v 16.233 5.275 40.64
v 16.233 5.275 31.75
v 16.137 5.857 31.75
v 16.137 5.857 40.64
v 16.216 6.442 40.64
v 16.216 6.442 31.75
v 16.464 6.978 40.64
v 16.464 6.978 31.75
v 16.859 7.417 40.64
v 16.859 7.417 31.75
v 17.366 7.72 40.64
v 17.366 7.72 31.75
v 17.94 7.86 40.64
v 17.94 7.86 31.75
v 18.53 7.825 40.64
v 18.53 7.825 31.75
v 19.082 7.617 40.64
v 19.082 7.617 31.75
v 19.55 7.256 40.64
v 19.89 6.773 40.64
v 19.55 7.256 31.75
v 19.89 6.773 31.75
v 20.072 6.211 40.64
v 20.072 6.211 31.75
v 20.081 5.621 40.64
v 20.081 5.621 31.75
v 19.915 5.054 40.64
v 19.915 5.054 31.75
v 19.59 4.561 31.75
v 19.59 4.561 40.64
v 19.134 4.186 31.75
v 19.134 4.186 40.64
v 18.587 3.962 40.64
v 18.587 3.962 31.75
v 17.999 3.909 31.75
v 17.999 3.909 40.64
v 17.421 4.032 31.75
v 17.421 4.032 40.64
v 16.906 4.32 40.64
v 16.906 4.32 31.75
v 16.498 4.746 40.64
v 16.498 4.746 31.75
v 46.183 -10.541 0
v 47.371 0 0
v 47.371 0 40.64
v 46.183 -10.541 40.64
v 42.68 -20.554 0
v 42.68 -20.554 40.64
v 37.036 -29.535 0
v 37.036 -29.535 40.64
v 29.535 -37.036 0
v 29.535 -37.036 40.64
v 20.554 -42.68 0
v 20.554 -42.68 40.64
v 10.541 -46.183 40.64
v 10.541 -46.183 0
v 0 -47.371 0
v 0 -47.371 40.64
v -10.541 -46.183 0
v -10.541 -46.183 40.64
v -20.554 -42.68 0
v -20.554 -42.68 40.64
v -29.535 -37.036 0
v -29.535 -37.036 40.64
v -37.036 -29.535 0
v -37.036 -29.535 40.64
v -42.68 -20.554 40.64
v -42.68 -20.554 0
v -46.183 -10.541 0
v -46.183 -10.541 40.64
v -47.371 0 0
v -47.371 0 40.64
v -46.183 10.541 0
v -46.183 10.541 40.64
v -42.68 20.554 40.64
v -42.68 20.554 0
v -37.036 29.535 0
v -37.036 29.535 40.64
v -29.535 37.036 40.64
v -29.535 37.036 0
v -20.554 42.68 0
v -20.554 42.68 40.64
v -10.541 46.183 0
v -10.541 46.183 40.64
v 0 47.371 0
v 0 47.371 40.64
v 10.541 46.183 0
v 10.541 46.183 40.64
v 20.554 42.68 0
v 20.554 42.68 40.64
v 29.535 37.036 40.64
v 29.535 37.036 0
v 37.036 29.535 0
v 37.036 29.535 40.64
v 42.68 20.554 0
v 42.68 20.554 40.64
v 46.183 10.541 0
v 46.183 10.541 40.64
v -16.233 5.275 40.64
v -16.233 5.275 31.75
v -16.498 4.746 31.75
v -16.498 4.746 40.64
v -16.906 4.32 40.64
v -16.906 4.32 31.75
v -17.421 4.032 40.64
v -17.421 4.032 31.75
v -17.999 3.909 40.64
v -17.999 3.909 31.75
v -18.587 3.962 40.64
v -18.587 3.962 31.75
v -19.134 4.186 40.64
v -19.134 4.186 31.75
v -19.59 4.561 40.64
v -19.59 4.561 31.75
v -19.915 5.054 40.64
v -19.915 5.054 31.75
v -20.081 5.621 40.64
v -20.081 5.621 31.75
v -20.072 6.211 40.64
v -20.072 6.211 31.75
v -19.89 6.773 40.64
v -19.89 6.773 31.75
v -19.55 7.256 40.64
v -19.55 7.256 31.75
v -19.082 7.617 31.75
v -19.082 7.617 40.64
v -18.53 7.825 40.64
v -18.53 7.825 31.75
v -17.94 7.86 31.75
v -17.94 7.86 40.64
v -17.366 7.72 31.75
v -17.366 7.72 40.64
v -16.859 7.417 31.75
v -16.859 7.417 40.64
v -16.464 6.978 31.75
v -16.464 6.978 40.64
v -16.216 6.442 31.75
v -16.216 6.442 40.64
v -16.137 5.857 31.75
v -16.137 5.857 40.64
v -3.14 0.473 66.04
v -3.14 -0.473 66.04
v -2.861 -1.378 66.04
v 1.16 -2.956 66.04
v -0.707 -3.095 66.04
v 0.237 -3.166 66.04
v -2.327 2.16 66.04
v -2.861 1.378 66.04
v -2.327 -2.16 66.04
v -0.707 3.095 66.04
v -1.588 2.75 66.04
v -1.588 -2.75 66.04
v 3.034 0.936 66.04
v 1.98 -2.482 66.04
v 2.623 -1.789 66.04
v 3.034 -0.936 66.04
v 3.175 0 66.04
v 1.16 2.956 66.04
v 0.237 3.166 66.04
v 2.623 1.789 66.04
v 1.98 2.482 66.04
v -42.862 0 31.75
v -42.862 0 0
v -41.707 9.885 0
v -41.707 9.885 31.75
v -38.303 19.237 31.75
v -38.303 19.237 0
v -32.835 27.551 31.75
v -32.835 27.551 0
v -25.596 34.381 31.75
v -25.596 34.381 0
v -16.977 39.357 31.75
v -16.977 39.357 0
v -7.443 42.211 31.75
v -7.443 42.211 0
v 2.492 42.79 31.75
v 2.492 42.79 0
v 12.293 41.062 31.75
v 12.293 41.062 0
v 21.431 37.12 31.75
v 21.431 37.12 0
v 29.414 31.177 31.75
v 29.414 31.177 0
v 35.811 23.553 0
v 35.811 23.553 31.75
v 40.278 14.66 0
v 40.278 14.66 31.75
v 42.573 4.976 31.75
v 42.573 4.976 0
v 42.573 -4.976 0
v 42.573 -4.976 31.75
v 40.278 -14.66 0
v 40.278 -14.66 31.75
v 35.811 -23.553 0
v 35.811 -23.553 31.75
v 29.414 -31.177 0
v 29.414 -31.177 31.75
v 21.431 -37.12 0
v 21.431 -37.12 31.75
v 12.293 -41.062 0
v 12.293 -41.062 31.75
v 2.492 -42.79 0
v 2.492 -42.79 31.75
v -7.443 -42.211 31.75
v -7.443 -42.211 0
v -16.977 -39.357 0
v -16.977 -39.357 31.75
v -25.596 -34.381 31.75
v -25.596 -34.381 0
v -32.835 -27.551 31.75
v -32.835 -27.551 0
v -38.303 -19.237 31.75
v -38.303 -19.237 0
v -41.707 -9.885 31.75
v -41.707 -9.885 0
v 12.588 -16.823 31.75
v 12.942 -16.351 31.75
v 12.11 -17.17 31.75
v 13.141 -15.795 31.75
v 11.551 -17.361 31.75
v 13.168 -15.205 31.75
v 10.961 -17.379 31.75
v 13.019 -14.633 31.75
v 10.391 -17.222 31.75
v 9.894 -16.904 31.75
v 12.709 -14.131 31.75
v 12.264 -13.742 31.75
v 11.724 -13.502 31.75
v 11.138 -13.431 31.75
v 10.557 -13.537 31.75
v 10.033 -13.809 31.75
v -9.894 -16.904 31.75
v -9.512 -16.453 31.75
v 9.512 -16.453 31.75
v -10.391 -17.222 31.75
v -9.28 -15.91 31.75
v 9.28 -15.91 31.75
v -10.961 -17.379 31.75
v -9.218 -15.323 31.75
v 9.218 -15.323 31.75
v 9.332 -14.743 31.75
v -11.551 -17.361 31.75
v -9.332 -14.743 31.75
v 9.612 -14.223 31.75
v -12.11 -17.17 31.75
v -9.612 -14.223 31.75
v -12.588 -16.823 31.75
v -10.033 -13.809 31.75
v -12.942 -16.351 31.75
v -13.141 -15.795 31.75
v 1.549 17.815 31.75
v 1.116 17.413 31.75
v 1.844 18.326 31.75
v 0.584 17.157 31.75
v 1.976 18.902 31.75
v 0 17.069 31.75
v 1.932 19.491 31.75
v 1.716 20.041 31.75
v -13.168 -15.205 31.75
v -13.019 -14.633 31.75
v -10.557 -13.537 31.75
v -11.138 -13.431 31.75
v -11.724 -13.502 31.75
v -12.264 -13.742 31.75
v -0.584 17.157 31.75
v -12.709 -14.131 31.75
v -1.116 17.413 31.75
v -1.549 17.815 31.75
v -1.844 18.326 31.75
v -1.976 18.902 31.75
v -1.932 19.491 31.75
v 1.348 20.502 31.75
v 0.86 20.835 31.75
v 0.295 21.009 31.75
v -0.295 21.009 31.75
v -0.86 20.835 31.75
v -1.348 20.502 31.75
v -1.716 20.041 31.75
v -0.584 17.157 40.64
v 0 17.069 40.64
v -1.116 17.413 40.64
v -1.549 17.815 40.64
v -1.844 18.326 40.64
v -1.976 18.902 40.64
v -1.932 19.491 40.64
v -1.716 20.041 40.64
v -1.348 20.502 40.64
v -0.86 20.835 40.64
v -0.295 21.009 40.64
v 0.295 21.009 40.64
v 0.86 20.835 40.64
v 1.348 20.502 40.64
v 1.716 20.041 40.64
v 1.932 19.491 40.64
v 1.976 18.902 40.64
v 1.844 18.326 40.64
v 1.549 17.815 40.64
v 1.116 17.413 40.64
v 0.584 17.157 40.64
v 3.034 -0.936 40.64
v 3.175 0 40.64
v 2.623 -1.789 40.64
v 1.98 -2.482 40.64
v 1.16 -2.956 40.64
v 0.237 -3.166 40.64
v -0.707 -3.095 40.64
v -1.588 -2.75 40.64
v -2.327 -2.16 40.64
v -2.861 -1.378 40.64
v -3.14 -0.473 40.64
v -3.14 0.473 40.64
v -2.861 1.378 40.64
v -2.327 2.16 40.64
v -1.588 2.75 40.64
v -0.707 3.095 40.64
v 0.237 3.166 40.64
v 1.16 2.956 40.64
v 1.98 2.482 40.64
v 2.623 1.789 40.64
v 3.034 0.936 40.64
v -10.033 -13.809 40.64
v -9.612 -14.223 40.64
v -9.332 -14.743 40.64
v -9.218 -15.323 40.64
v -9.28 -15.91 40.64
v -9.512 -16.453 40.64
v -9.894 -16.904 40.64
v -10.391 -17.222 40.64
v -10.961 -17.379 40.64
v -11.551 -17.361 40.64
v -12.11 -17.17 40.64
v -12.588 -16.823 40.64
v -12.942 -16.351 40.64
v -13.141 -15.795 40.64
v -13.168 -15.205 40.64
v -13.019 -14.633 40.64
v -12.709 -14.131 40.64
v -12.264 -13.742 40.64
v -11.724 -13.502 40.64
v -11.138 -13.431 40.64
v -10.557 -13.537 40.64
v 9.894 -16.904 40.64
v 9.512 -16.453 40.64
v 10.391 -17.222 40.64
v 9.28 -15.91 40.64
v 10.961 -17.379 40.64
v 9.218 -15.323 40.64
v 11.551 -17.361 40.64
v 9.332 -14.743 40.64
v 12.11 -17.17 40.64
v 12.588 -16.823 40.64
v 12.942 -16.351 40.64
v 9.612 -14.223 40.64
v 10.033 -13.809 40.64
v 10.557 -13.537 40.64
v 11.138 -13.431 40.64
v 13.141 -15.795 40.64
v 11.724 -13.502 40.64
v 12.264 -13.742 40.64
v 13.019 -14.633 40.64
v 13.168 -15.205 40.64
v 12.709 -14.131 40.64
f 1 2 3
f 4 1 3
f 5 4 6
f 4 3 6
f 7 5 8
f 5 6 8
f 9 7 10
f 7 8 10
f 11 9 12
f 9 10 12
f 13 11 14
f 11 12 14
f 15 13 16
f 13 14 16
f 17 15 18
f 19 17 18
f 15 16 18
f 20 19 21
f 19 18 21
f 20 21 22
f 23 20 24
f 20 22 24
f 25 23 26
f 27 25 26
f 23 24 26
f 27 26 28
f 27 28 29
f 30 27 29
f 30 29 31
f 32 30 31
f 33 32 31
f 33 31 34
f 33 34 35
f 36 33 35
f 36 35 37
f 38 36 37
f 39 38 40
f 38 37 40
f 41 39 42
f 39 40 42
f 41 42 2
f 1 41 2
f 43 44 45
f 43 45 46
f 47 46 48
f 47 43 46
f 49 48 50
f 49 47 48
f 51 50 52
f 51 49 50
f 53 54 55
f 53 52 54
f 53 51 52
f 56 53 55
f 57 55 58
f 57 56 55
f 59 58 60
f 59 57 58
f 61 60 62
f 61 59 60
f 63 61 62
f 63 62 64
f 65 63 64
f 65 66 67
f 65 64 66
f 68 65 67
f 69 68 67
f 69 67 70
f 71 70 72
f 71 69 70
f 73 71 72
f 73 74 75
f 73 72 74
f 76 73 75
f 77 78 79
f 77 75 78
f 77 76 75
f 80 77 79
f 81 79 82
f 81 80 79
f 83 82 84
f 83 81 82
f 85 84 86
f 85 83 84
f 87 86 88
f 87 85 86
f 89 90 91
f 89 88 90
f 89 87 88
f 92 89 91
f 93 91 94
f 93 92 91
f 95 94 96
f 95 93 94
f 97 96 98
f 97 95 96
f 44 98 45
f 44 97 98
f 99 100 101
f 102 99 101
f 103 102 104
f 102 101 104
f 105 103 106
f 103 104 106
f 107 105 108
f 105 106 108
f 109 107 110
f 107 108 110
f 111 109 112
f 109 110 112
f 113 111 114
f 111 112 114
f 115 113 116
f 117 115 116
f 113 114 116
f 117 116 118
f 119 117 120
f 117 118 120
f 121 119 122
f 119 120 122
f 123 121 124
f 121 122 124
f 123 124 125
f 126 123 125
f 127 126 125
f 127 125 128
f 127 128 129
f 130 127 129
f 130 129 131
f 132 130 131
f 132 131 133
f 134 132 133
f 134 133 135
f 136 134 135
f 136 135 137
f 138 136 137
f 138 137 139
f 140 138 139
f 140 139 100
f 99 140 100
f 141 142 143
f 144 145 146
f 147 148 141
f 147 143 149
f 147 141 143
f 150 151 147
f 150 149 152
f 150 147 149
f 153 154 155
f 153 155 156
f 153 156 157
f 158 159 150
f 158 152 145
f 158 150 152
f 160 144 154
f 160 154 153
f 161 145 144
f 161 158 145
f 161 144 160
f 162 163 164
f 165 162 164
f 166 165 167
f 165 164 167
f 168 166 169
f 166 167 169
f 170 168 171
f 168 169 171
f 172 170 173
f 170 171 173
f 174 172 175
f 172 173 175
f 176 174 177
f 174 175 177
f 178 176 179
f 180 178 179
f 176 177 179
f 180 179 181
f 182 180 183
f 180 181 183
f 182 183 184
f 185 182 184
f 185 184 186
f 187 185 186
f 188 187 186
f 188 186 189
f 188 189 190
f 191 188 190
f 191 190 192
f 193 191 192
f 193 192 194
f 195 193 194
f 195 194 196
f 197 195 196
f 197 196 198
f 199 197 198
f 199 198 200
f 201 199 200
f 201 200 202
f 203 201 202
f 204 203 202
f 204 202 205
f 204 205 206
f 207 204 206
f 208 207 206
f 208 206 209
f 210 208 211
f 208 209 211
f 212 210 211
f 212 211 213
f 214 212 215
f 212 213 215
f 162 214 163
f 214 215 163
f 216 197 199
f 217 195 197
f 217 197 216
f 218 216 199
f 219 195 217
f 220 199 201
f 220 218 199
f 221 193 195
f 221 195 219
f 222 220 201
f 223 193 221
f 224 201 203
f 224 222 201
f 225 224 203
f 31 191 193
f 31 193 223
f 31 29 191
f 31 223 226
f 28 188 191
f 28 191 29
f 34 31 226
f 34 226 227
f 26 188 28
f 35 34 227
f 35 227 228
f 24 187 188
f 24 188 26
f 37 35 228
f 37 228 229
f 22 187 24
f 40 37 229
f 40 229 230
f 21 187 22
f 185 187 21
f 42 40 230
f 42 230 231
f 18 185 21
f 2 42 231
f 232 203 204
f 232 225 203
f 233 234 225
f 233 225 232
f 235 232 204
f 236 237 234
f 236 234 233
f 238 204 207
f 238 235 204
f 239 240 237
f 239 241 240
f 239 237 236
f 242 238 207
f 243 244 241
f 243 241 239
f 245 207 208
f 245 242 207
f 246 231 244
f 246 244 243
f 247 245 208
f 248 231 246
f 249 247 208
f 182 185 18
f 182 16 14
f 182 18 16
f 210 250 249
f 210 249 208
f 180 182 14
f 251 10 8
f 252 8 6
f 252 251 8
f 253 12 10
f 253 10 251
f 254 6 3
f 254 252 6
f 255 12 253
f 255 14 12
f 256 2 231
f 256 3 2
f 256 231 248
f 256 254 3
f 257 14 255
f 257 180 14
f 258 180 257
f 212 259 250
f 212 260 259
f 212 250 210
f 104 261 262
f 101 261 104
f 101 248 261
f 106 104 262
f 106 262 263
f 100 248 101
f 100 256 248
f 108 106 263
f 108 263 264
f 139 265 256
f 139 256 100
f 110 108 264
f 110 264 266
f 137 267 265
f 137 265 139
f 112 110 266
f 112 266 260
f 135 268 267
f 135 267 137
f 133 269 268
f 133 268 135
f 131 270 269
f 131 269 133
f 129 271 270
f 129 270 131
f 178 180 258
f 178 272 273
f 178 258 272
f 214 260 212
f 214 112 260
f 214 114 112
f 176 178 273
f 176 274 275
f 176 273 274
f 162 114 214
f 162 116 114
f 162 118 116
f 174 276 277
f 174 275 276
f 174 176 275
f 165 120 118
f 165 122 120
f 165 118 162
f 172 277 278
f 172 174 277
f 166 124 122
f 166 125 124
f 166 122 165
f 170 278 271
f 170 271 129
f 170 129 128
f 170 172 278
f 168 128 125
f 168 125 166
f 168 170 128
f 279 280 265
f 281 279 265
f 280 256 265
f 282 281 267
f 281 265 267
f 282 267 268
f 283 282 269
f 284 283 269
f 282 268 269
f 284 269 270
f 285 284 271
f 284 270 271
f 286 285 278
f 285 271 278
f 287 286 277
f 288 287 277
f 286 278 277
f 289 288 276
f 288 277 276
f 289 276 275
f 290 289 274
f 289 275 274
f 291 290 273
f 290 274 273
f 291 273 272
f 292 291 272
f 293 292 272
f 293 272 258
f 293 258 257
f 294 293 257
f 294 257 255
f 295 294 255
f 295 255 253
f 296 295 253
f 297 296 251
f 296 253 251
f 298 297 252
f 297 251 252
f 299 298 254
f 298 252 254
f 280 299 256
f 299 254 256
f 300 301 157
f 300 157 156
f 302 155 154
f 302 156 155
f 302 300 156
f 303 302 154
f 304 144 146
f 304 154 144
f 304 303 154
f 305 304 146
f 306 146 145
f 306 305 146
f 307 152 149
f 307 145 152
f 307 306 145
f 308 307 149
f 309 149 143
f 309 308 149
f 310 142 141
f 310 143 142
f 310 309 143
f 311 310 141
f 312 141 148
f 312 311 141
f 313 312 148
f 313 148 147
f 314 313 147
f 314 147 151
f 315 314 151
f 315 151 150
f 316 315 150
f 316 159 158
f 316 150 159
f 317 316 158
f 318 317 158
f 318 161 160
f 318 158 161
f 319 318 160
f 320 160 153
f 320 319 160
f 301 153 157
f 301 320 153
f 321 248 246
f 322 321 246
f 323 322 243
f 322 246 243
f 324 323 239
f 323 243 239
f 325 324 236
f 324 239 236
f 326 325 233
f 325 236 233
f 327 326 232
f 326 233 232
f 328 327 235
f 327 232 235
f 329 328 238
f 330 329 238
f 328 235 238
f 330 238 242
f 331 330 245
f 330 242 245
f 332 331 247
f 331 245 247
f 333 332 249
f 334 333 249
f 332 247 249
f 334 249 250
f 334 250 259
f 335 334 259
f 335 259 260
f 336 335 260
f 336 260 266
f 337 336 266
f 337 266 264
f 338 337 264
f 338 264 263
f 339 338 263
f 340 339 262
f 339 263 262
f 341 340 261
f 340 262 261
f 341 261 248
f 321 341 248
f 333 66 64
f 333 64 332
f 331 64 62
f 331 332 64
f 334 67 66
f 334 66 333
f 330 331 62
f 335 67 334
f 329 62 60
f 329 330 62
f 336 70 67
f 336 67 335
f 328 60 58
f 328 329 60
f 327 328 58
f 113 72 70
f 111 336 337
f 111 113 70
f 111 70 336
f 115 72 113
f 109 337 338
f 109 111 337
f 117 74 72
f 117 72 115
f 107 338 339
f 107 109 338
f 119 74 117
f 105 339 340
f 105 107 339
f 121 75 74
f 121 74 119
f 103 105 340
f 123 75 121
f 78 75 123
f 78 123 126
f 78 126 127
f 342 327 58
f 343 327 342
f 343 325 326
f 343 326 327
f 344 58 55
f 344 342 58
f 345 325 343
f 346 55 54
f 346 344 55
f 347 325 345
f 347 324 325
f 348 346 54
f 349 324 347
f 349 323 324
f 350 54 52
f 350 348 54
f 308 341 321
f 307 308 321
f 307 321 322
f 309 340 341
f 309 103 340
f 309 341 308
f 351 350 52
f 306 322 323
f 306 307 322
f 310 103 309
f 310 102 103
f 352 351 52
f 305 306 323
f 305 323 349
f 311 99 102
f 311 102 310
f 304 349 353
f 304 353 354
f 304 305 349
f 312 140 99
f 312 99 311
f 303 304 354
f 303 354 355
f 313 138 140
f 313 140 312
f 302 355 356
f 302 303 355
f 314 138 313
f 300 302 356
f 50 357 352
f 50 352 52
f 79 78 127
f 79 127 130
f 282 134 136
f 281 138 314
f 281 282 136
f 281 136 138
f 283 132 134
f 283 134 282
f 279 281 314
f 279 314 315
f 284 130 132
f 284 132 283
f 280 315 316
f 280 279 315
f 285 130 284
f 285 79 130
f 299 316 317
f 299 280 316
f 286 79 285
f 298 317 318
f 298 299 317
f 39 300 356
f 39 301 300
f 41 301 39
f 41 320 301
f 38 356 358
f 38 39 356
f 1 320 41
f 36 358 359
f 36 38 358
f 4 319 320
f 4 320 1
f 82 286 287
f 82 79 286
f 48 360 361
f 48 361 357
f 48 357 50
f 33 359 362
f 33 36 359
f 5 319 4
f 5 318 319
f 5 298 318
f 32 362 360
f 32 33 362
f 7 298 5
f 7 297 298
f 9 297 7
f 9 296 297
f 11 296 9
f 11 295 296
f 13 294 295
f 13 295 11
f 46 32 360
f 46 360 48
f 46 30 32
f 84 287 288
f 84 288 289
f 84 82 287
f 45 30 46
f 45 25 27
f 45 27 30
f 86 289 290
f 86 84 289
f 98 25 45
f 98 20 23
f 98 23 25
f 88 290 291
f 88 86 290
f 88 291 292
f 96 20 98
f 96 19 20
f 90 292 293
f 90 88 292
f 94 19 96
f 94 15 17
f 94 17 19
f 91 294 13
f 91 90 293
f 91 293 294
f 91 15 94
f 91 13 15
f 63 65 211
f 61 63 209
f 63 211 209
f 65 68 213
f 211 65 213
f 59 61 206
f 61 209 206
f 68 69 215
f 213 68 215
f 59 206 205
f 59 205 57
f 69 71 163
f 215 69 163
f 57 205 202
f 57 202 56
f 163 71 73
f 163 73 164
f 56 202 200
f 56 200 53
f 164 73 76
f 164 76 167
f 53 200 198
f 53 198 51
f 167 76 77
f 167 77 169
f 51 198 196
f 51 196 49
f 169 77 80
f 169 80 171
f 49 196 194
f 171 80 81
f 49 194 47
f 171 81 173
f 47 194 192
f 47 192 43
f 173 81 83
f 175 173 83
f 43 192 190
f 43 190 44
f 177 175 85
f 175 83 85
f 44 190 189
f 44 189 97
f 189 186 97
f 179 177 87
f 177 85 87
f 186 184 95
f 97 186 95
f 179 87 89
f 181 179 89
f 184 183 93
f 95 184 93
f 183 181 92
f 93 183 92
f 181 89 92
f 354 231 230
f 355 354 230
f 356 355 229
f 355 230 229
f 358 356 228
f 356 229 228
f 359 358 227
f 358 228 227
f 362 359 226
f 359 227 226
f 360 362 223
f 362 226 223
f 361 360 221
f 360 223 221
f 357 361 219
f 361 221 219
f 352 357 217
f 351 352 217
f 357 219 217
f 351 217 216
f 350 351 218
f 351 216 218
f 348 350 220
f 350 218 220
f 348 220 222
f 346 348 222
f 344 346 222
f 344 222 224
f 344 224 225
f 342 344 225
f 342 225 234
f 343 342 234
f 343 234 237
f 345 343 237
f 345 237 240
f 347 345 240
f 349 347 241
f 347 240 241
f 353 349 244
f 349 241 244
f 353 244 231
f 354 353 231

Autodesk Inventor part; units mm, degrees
ref_plane "YZ Plane" through (0, 0, 0) normal (1, 0, 0) x (0, 1, 0)
ref_plane "XZ Plane" through (0, 0, 0) normal (0, 1, 0) x (-1, 0, 0)
ref_plane "XY Plane" through (0, 0, 0) normal (0, 0, 1) x (1, 0, 0)
sketch "Sketch1" plane through (0, 0, 0) normal (0, 0, 1) x (1, 0, 0)
  circle A0 centre (0, 0) radius 47.371
  dimension "d0" = 94.742
extrude "Extrusion1" add sketch "Sketch1" along normal blind 40.64
sketch "Sketch2" plane through (0, 0, 0) normal (0, 0, -1) x (-1, 0, 0)
  circle A0 centre (0, 0) radius 42.8625
  dimension "d4" = 85.725
extrude "Extrusion2" cut sketch "Sketch2" against normal blind 31.75
sketch "Sketch6" plane through (0, 0, 40.64) normal (0, 0, 1) x (1, 0, 0)
  circle A0 centre (0, 0) radius 47.371 projected
  circle A1 centre (0, 0) radius 19.05
  line L0 (0, 19.05) -> (0, 0) construction
  dimension "d24" = 38.1
hole "Hole3" at (0, 19.05, 40.64) direction (0, 0, -1) diameter 3.9624 depth 25.4 tip angle 118 thread size "10-32 UNF" class "2B" standard "ANSI Unified Screw Threads"
pattern_circular "Circular Pattern1" count 5 over 360 about axis through (0, 0, 0) along (0, 0, 1) of "Hole3"
sketch "Sketch7" plane through (0, 0, 40.64) normal (0, 0, 1) x (1, 0, 0)
  circle A0 centre (0, 0) radius 47.371 projected
  circle A1 centre (0, 0) radius 3.175
  dimension "d37" = 6.35
extrude "Extrusion4" add sketch "Sketch7" along normal blind 25.4 contours A1
properties part number "Aluminum mold support"
